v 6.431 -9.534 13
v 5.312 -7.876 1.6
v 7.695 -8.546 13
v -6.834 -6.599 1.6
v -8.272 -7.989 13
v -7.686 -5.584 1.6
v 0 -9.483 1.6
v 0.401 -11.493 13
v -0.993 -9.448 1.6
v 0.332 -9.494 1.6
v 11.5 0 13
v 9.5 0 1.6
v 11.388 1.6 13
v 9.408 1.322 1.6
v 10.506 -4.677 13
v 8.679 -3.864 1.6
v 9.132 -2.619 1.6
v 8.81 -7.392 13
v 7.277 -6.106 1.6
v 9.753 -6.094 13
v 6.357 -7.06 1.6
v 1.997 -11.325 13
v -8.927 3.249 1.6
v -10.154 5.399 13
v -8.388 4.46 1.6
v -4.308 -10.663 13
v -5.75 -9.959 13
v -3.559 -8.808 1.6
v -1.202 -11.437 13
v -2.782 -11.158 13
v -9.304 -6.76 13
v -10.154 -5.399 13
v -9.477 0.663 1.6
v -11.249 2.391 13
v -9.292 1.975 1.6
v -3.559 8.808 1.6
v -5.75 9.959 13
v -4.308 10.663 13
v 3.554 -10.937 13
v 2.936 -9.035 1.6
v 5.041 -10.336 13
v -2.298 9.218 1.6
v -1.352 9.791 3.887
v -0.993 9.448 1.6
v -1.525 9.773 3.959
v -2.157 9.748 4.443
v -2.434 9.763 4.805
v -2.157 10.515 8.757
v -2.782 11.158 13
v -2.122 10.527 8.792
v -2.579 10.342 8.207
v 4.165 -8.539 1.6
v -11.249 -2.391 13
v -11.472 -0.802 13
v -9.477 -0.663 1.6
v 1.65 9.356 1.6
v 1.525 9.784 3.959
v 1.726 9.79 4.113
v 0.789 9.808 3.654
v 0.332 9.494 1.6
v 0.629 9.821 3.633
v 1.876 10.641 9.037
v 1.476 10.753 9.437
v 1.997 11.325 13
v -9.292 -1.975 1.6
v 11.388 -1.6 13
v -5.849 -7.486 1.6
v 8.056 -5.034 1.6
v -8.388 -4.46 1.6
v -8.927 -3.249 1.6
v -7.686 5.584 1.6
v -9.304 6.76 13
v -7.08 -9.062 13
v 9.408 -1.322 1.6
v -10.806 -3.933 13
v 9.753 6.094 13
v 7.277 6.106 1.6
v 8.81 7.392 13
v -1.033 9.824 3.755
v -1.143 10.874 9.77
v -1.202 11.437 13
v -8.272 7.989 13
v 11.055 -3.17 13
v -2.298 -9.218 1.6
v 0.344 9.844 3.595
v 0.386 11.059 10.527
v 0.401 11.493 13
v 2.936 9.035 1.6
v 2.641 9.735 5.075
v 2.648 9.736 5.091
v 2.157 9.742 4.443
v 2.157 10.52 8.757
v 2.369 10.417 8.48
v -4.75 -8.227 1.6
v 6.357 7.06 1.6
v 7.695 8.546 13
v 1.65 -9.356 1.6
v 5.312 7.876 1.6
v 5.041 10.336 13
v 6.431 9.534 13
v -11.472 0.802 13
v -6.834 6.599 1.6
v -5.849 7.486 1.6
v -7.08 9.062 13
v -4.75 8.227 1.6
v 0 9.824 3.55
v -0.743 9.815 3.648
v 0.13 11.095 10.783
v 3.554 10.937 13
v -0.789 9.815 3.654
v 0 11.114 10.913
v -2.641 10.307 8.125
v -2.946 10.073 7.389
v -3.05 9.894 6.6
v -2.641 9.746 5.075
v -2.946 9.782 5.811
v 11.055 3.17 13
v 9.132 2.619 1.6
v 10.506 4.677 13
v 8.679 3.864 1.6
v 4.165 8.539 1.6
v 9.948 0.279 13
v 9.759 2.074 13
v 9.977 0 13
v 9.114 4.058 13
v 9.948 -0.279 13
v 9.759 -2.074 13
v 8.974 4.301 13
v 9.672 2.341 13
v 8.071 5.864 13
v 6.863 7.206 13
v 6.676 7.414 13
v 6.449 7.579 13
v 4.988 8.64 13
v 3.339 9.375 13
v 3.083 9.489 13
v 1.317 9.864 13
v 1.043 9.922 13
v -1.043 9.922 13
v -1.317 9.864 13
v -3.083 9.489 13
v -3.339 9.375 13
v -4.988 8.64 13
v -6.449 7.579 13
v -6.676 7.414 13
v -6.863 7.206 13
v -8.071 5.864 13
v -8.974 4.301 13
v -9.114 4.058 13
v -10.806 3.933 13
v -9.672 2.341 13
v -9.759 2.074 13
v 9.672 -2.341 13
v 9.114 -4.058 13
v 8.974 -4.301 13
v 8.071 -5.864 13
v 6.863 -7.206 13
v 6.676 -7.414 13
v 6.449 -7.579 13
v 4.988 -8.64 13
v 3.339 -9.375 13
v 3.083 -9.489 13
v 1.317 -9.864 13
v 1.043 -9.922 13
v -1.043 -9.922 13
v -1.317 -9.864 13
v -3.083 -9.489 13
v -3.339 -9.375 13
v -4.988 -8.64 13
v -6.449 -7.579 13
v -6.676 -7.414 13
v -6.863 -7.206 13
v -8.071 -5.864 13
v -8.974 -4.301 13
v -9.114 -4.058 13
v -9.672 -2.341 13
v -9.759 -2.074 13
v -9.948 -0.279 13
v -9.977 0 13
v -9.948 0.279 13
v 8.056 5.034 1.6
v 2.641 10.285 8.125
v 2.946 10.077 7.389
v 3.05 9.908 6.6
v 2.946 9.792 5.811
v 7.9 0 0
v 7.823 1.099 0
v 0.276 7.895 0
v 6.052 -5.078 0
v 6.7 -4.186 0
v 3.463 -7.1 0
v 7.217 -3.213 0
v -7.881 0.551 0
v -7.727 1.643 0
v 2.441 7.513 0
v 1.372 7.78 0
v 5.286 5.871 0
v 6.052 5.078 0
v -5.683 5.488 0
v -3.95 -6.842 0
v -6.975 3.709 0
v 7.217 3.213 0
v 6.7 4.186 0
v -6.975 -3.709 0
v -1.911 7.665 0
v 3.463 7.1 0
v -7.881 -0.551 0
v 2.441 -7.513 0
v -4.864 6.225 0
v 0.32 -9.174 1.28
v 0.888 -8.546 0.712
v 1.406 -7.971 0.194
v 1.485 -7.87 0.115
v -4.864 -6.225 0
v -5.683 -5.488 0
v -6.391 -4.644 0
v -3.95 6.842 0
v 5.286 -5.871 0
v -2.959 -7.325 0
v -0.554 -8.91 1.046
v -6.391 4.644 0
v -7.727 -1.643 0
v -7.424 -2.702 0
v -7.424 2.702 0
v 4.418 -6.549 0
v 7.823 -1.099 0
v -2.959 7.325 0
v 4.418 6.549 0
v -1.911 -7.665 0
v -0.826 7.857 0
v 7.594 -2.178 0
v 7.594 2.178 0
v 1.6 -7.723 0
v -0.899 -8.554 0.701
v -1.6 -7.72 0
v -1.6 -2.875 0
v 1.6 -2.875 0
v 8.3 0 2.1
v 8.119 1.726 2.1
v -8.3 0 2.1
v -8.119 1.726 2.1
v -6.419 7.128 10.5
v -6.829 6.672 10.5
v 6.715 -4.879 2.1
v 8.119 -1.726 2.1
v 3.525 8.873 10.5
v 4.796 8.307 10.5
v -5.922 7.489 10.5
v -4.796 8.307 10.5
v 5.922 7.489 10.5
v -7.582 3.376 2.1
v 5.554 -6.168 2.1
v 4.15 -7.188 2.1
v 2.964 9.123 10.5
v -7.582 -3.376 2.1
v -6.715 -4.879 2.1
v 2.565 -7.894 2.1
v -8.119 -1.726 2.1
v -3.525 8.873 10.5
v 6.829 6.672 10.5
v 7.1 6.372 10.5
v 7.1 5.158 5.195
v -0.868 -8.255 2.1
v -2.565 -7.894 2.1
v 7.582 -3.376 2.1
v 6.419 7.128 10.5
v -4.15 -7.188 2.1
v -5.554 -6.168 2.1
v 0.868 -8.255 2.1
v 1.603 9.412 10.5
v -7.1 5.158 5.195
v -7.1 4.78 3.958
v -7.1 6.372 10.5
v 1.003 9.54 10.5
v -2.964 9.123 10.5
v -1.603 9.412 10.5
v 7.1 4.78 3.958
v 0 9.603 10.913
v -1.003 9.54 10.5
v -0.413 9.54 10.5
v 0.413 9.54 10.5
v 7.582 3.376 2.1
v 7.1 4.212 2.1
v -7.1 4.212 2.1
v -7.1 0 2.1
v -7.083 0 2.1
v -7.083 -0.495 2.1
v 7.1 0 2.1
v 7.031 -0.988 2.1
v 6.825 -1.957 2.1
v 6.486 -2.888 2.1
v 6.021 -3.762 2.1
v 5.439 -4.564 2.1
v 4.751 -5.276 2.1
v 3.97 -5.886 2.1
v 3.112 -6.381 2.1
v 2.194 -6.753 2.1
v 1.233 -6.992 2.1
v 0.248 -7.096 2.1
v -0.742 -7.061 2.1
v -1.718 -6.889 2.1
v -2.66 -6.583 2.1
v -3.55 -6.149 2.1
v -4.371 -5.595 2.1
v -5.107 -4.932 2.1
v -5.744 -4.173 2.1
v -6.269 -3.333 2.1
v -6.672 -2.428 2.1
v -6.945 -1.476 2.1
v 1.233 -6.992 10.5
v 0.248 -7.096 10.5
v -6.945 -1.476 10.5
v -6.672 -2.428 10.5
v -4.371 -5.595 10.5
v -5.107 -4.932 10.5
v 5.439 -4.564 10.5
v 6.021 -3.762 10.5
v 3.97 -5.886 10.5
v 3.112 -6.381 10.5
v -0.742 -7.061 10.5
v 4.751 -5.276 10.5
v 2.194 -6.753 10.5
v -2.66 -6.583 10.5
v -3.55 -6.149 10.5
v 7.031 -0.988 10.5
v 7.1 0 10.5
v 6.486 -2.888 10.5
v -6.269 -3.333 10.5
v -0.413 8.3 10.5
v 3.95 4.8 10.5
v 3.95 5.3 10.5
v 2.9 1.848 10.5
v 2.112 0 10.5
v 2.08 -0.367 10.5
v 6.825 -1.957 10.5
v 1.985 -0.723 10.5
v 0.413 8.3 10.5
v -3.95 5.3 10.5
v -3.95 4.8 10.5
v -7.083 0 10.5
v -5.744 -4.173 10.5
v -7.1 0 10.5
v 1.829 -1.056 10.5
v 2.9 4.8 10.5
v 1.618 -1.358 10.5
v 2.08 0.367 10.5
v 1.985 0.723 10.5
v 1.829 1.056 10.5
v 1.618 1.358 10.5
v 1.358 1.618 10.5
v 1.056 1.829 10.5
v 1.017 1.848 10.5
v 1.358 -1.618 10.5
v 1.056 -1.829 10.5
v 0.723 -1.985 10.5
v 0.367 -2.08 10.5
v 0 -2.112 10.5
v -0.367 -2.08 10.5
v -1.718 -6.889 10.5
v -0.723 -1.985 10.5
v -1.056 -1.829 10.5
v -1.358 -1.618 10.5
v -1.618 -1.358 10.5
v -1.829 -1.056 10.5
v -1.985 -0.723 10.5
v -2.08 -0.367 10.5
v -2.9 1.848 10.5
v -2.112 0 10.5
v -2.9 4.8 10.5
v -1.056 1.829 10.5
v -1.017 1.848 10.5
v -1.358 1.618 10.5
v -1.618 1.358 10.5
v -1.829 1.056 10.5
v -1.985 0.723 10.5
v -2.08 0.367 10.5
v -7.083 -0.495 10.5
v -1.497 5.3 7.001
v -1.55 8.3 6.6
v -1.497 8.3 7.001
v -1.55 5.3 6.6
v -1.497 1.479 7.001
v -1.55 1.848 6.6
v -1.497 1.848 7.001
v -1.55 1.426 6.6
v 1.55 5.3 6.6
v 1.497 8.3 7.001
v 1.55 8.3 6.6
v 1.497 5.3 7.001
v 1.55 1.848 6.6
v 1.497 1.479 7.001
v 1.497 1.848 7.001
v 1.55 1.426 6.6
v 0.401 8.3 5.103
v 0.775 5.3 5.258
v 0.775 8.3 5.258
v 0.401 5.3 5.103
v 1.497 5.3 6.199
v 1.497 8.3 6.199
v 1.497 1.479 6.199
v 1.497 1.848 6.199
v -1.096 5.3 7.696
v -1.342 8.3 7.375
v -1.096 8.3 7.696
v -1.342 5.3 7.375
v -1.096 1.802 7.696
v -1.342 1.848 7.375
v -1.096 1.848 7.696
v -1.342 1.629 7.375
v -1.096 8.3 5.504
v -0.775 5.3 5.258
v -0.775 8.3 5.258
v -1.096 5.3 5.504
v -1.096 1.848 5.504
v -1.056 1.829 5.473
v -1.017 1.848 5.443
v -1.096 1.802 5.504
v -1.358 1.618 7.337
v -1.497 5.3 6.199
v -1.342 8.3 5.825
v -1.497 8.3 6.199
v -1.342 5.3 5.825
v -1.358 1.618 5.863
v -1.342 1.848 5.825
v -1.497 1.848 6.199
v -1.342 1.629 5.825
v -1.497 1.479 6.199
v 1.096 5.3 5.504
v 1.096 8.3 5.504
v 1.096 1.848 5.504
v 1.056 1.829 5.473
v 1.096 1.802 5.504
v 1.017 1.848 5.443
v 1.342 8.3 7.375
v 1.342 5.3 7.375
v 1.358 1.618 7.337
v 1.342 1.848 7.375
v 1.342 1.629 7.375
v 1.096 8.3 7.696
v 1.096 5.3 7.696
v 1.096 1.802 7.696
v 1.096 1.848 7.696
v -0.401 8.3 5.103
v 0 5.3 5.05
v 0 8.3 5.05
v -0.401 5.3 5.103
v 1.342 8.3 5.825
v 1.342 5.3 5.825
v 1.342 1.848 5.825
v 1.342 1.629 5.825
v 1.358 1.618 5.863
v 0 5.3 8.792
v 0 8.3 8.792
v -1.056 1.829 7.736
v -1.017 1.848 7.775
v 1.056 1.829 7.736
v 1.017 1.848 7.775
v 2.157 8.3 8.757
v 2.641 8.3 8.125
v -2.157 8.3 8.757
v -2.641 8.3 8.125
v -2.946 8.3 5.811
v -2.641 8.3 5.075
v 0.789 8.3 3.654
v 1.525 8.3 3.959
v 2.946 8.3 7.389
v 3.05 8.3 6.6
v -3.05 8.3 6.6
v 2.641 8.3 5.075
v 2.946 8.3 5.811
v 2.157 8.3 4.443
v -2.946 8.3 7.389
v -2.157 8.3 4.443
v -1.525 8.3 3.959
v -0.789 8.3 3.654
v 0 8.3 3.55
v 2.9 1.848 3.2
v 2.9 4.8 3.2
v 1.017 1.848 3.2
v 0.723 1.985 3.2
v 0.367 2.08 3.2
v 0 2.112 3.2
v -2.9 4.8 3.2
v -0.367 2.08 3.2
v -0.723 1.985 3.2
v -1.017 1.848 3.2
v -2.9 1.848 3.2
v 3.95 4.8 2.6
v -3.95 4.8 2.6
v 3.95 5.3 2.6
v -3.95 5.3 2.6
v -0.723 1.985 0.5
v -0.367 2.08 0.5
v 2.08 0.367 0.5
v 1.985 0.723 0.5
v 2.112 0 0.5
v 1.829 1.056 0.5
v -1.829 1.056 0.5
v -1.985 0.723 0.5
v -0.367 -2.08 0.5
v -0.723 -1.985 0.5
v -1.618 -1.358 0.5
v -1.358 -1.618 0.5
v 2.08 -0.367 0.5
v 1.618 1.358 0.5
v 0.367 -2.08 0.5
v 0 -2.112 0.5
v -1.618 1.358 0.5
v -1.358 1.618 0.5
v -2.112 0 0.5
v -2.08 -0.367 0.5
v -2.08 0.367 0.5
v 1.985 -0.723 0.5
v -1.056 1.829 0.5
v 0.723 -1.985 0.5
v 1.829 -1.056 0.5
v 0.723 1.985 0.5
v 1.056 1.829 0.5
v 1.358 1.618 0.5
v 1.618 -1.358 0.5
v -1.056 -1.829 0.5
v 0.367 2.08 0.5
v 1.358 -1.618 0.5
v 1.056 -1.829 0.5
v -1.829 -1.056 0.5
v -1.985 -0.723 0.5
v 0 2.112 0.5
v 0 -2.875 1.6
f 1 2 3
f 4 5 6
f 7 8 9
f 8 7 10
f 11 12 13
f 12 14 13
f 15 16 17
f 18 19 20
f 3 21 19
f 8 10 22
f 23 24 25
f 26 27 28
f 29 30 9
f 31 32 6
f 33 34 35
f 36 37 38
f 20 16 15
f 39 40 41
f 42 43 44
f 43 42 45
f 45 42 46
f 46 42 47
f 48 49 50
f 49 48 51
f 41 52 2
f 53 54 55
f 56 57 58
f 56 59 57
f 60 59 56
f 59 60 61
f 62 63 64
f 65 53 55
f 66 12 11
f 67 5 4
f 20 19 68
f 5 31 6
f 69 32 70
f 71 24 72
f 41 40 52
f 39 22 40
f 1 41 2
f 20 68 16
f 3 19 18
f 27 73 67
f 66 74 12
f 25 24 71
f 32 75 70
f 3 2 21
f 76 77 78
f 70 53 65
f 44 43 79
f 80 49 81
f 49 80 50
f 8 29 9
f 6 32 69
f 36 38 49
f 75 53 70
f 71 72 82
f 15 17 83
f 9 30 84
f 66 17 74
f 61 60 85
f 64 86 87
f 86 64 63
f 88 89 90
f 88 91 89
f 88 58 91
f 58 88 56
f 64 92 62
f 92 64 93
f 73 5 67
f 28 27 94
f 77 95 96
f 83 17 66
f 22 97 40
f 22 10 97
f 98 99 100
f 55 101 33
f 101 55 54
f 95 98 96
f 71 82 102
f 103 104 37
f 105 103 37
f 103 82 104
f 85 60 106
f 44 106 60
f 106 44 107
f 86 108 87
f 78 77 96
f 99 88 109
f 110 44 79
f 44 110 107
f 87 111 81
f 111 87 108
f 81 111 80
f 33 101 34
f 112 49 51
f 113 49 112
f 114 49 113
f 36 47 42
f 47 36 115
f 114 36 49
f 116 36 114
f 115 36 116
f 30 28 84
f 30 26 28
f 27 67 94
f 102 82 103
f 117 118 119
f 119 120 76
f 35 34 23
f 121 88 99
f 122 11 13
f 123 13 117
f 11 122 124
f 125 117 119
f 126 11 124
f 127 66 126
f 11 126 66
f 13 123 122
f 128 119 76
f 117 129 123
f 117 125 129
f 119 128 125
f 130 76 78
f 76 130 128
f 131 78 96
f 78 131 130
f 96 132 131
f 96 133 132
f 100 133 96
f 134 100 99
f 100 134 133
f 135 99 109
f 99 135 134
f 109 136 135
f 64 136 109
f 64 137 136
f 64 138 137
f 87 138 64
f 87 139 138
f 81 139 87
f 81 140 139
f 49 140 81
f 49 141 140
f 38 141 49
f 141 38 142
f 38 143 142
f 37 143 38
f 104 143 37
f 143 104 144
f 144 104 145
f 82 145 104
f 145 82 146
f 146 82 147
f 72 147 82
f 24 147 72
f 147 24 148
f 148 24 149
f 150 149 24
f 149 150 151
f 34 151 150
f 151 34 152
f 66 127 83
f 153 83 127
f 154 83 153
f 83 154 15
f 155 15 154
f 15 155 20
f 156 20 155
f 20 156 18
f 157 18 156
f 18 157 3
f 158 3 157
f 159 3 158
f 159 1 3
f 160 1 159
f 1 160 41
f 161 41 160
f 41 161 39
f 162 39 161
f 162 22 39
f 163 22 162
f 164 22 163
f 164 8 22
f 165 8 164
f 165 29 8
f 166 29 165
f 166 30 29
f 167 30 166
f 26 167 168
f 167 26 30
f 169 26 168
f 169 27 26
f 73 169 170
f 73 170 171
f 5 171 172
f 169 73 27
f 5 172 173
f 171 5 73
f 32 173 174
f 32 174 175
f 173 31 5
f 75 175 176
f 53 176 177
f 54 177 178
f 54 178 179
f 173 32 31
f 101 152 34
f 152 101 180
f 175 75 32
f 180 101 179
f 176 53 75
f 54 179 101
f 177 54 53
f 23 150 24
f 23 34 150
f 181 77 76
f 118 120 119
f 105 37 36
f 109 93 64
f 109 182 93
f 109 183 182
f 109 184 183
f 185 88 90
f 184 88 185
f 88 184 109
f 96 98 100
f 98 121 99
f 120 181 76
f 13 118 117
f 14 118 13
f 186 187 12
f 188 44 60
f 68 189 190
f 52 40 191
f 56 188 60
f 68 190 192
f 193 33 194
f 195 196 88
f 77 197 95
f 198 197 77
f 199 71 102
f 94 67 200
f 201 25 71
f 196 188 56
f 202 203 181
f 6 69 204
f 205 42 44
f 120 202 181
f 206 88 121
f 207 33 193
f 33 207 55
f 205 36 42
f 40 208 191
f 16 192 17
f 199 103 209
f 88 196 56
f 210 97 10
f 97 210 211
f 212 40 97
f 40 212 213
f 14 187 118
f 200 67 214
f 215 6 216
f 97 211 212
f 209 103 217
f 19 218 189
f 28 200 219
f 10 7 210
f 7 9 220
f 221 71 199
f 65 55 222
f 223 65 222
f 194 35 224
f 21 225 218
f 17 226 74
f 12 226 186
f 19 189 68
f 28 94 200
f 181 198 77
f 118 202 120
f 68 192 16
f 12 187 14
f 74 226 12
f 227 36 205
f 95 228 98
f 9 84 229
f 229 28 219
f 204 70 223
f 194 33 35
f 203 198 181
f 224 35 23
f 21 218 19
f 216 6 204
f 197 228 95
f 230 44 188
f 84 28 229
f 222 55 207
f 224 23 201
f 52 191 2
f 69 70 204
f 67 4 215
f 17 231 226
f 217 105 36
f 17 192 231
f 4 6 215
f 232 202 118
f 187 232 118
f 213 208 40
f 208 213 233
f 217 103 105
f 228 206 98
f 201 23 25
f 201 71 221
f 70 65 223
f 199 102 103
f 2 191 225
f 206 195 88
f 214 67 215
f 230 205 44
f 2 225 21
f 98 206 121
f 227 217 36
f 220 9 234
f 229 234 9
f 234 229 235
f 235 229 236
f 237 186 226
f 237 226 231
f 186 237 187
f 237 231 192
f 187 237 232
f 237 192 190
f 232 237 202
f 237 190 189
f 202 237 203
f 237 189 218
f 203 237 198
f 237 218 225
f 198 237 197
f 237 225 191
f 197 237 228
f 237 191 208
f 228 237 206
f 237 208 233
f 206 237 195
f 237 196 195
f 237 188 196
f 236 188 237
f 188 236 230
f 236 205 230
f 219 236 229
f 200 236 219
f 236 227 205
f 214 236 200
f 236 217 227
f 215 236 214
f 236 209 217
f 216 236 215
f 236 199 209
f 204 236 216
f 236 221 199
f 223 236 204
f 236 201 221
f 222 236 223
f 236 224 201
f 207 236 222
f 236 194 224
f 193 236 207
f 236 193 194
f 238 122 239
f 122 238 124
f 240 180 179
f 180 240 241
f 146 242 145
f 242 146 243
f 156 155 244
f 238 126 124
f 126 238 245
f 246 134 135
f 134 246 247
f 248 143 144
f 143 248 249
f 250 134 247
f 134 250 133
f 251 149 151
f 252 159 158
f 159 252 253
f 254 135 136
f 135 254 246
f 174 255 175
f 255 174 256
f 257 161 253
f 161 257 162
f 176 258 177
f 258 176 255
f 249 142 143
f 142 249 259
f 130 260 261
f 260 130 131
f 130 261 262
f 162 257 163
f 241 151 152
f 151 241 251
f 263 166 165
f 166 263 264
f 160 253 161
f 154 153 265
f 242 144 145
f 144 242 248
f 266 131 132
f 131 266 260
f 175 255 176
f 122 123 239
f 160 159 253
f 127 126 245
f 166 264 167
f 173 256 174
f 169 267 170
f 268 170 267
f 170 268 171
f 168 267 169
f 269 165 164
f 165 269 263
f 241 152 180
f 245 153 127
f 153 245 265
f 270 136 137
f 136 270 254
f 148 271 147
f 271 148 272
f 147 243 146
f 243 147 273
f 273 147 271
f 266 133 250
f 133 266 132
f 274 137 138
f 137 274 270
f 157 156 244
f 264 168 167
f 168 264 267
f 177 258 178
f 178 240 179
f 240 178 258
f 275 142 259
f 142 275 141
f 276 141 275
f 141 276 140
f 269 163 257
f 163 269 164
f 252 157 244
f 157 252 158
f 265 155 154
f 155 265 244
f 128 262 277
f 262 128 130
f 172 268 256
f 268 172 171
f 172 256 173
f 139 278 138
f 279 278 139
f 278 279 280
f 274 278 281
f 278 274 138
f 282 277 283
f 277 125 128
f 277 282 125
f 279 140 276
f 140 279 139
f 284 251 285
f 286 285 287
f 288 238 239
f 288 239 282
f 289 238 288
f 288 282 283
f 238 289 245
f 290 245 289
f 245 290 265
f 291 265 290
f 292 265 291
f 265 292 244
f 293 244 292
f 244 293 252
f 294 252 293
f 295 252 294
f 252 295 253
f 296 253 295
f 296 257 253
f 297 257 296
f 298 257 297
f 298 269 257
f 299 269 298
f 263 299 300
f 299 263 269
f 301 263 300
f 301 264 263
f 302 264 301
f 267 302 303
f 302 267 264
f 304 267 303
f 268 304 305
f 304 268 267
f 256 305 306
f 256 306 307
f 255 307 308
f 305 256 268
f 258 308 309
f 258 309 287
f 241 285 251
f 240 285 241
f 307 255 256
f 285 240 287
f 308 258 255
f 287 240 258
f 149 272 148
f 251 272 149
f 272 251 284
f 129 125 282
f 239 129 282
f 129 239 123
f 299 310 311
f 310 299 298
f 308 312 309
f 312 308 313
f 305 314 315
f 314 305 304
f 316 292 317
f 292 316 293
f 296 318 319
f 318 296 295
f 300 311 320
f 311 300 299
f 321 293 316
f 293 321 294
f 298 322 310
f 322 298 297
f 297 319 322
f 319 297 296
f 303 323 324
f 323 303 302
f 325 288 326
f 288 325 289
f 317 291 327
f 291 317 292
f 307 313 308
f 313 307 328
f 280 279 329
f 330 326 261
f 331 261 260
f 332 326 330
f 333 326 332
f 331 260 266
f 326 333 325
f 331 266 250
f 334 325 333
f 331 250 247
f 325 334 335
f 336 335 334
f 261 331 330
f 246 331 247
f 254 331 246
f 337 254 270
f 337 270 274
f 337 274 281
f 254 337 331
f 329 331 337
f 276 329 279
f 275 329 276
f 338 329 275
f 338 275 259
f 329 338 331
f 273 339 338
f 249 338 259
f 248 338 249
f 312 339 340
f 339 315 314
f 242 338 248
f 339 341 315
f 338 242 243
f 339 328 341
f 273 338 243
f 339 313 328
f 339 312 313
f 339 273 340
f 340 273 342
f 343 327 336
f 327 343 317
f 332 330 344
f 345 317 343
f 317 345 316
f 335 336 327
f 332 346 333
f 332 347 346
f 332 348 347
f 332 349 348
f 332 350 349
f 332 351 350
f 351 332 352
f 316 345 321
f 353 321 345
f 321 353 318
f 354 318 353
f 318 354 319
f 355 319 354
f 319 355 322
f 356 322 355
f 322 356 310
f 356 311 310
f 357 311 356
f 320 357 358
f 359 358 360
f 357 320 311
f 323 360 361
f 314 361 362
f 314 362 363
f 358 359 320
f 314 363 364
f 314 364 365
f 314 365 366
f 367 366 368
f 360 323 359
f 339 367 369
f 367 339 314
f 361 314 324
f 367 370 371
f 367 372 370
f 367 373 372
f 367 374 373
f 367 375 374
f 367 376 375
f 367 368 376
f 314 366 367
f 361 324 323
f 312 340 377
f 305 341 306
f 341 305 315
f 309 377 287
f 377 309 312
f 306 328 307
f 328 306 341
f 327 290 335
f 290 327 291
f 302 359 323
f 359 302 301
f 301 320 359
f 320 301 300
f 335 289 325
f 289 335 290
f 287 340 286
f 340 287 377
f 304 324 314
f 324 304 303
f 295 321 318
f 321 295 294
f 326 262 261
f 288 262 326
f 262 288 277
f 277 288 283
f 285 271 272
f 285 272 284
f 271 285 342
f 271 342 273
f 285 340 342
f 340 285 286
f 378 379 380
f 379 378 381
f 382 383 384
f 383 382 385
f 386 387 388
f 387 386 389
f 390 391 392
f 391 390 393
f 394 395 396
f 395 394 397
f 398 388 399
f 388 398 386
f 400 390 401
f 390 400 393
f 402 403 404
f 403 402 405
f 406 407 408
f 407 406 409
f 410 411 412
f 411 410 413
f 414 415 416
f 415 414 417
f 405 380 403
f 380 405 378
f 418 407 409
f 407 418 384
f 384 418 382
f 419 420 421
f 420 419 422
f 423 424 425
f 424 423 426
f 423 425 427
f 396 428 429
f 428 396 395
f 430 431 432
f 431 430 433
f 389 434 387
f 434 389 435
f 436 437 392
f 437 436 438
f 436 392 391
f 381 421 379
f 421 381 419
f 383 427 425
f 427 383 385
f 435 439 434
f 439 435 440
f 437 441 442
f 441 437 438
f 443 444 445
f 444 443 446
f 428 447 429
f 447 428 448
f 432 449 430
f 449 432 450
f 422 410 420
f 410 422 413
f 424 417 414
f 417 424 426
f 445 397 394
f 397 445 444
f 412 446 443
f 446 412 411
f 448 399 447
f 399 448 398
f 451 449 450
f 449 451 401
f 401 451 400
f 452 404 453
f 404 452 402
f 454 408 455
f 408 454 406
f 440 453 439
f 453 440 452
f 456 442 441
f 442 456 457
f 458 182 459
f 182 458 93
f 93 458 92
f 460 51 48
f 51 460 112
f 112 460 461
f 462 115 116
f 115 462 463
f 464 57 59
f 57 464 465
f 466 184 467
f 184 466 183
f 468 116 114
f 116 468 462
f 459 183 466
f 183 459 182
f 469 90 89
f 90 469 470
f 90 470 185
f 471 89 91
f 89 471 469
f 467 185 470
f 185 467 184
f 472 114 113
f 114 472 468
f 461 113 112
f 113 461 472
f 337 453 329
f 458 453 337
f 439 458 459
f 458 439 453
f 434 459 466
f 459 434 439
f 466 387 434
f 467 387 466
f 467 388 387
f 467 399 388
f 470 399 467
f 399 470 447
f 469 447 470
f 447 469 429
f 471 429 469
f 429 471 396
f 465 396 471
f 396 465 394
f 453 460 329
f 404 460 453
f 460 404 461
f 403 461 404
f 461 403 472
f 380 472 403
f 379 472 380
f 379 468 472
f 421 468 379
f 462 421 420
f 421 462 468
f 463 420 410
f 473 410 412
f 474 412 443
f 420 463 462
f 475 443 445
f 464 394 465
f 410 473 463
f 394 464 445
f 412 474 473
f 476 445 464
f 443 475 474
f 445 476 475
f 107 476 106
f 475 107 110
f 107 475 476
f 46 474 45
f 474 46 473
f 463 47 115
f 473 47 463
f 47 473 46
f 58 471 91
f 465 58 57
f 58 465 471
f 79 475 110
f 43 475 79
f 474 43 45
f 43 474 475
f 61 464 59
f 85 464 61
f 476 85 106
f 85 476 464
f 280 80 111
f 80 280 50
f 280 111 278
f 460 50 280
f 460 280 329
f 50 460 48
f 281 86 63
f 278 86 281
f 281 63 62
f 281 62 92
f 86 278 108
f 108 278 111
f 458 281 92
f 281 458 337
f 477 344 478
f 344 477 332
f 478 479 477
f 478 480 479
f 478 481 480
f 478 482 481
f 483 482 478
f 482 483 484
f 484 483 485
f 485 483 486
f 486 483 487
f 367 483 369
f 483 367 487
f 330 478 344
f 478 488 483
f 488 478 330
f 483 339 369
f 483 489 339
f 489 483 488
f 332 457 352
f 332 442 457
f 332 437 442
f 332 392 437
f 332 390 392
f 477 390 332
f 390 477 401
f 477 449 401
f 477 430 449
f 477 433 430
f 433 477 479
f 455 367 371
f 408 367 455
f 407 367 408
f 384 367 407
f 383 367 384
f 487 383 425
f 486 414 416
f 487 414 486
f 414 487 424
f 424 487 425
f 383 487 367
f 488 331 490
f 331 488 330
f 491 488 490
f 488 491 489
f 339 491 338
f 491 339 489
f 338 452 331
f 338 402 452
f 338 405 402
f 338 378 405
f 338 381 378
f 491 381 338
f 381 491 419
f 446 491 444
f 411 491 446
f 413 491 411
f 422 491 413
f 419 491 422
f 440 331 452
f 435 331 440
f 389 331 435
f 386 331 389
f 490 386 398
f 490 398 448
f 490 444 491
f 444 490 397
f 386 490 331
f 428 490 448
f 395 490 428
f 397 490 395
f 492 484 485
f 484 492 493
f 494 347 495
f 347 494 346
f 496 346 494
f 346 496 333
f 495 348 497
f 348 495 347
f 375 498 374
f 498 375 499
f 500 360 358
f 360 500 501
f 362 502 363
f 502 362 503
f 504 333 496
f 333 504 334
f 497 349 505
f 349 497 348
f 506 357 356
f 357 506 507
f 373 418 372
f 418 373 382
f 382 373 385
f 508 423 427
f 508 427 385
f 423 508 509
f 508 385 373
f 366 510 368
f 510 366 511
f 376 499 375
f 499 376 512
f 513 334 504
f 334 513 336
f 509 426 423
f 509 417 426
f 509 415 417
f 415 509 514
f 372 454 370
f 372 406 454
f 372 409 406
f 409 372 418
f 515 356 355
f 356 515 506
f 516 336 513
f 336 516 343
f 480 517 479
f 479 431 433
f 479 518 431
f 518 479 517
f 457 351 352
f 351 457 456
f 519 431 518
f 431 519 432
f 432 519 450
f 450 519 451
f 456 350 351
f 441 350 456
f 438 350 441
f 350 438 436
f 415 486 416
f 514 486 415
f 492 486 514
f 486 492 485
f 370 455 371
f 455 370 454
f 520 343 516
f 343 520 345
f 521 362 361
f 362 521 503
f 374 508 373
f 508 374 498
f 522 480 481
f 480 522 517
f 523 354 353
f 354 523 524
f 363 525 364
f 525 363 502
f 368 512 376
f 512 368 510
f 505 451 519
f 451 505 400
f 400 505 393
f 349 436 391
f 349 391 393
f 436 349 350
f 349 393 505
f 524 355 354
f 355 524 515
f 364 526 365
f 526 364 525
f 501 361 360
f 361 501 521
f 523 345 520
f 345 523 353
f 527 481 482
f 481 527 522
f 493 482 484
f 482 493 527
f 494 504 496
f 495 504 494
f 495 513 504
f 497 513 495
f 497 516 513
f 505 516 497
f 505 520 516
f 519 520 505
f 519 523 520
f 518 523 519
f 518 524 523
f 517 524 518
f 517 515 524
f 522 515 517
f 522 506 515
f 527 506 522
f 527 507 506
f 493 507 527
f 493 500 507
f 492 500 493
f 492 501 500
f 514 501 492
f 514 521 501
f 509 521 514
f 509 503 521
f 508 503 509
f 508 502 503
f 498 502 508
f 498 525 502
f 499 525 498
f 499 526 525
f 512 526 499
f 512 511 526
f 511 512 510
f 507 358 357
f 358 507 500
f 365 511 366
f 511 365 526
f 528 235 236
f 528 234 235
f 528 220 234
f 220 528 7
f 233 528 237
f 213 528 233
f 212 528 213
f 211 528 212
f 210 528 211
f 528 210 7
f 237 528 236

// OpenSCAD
/*

    **** ROBUST PARAMETRIC KNOB FOR ROTARY CONTROLS *****

    Torbjorn Skauli (tskauli@gmail.com)
    August 2018, released in the public domain.

This is a rotary knob such as those used for volume controls. The shape of the knob can be adjusted, mainly by changing its outer diameter, height and taper towards the top. It is also possible to add an arrow indicator on the top surface, and the shape can be made faceted rather than round. A bevelled edge around the top is also adjustable in the code.

The knob normally uses a set screw from the side. The screw is held by a nut resting on a washer, to ensure strength that allows for tightening. Either a headless setscrew can be used, or an optional recess for a flat head screw can be enabled. It is also possible to disable the screw and nut holes, for press fit on the shaft The inner structures can be recessed into the knob to enclose the mounting nut of the shaft in the panel.

The knob is designed to be printed upside down, and does not need any support material on printers capable of printing a 45-degree overhang, thanks to teardrop-shaped holes.

To assemble, first insert a washer and a nut in their slots, and then thread the screw in from the side. The washer may need to be pressed in with some force using pliers, depending on the accuracy of the print. If using a headed screw, the knob looks nicest if the screw length is such that the head is approximately flush with the outer surface when tightened.

*/
has_setscrew=1; // [ 1:include a set screw, 0:only shaft hole ]
has_arrow=1;    // [ 1:include an indicator arrow, 2:plain top ]
has_screwhead=1;// [ 1:screw with head - enlarged hole, 0:hex socket set screw ]

// No. of outer facets, or =0 if smooth
facets=0;       

// Pot/encoder axis diameter
axdia=4.2;      

// Knob outer diameter
outdia=23;      

// Height of outer part of knob
outheig=13;     

// Recess depth inside outer shell to accommodate pot panel mount nut
innerrecess=2.5;

// Radius reduction for tapering of main part, =0 for cylindrical shape.
rtaper=2;       

// set screw diameter
scrdia=3;       

/* [Hidden] */
twall=1.2;      // outer wall thickness
thinwall=0.5;   // thickness at the bottom of the axis hole (to push in as far as possible)
taxis=5;        // thickness of material around axis
tol=0.025;      // tolerance for fit, adapt to printer
gap=0.1;        // loose fit, adapt to printer
cacc=3;         // SPEED / ACCURACY scaling factor for $fn etc. 1=draft, >1=final
rbevel=1.6;     // delta radius to bevel start, also depth of arrow

// Hardware dimensions (adapted from. http://www.metrication.com/engineering/fastener.html)
scrhdia=2*scrdia;       // screw head diameter
washdia=2.6*scrdia;     // washer diameter and thickness
washthic=0.5;           // washer thickness
nutdia=1.9*scrdia;      // nut smallest diameter
nutdiaouter=2.2*scrdia; // nut largest diameter and thickness (check)
nutthic=0.9*scrdia;     // nut thickness
axgapfac=0.06;          // factor to move nut room closer to axis, rel to axis radius to avoid thin walls between nut and axis

wscrbase=axdia+2*taxis; // width of screw base
lscrbase=4*scrdia;      // length of screw base
innheig=outheig-innerrecess;// height of inner part
scrheig=innheig-max(washdia/2, scrdia);// height of screw hole

module teardropHole(lh,rh){ // Hole with 45-degree teardrop shape, no support material
    rotate([0,0,-135])
    union(){
        cylinder(h=lh,r1=rh,r2=rh,$fn=8*cacc);
        cube([rh,rh,lh]);
    };
};
module outershape(){ // Outer shape of knob
    union(){
        if (facets){
            translate([0,0,rbevel])
            cylinder(r1=(outdia)/2-rtaper,r2=outdia/2,h=outheig-rbevel,$fn=facets);
            cylinder(r1=(outdia)/2-rbevel-rtaper,r2=(outdia)/2-rtaper,h=rbevel,$fn=facets);
        }
        else{
            translate([0,0,rbevel])
            cylinder(r1=(outdia)/2-rtaper,r2=outdia/2,h=outheig-rbevel,$fn=15*cacc);
            cylinder(r1=(outdia)/2-rbevel-rtaper,r2=(outdia)/2-rtaper,h=rbevel,$fn=15*cacc);
        };
        
    };
};
module cavity(){ // inner cavity, to save plastic
    translate([0,0,max(twall,rbevel+thinwall)]) // cavity to save plastic
    cylinder(r1=(outdia)/2-twall-rtaper,r2=(outdia)/2-twall,h=outheig,$fn=10*cacc);
};
module axismount(){ // axis hole and clamp screw block
    intersection(){
        union(){ 
            // axis tube
            cylinder(d=axdia+2*taxis,h=innheig,$fn=15*cacc);
            // block for nut
            if (has_setscrew)
                translate([-wscrbase/2,0,0])
                cube([wscrbase,outdia/2,innheig]);
        };
        // ensure fit within outer shape
        outershape();
    };
};
module holes(){ // shapes to be carved out of the knob
    // axis hole
    translate([0,0,thinwall]) 
    cylinder(d=axdia+tol,h=innheig,$fn=12*cacc);

    // arrow indicator
    if (has_arrow)
        translate([0,-outdia/8,0])
        rotate([90,0,0])
        cylinder(r=rbevel,h=outdia,$fn=4);
    
    // holes and recesses for screw, nut and washer
    if (has_setscrew) {
        // screw hole
        translate([0,0,scrheig])
        rotate([-90,0,0])
        teardropHole(rh=(scrdia+gap)/2,lh=outdia);
        
        //nut recess
        translate([-(nutdia+gap)/2,axdia*(0.5-axgapfac),scrheig-nutdiaouter/2-gap])
        cube([nutdia+gap,nutthic+axdia*axgapfac,outheig]);
        
        
        // washer recess
        translate([-(washdia+gap)/2,axdia/2+nutthic,scrheig-washdia/2-gap])
        cube([washdia+gap,washthic,outheig]);
        
        // screw head recess
        if (has_screwhead)
            translate([0,axdia/2+nutthic+washthic+scrdia,scrheig])
            rotate([-90,0,0]) 
            teardropHole(rh=(scrhdia+gap)/2,lh=outdia);
    };
  
};
difference(){ // screw holes and arrow erosion
    union(){ // shell and screw mount
        difference(){
            outershape();
            cavity();
        };
        axismount();    

    };
        holes();
};
